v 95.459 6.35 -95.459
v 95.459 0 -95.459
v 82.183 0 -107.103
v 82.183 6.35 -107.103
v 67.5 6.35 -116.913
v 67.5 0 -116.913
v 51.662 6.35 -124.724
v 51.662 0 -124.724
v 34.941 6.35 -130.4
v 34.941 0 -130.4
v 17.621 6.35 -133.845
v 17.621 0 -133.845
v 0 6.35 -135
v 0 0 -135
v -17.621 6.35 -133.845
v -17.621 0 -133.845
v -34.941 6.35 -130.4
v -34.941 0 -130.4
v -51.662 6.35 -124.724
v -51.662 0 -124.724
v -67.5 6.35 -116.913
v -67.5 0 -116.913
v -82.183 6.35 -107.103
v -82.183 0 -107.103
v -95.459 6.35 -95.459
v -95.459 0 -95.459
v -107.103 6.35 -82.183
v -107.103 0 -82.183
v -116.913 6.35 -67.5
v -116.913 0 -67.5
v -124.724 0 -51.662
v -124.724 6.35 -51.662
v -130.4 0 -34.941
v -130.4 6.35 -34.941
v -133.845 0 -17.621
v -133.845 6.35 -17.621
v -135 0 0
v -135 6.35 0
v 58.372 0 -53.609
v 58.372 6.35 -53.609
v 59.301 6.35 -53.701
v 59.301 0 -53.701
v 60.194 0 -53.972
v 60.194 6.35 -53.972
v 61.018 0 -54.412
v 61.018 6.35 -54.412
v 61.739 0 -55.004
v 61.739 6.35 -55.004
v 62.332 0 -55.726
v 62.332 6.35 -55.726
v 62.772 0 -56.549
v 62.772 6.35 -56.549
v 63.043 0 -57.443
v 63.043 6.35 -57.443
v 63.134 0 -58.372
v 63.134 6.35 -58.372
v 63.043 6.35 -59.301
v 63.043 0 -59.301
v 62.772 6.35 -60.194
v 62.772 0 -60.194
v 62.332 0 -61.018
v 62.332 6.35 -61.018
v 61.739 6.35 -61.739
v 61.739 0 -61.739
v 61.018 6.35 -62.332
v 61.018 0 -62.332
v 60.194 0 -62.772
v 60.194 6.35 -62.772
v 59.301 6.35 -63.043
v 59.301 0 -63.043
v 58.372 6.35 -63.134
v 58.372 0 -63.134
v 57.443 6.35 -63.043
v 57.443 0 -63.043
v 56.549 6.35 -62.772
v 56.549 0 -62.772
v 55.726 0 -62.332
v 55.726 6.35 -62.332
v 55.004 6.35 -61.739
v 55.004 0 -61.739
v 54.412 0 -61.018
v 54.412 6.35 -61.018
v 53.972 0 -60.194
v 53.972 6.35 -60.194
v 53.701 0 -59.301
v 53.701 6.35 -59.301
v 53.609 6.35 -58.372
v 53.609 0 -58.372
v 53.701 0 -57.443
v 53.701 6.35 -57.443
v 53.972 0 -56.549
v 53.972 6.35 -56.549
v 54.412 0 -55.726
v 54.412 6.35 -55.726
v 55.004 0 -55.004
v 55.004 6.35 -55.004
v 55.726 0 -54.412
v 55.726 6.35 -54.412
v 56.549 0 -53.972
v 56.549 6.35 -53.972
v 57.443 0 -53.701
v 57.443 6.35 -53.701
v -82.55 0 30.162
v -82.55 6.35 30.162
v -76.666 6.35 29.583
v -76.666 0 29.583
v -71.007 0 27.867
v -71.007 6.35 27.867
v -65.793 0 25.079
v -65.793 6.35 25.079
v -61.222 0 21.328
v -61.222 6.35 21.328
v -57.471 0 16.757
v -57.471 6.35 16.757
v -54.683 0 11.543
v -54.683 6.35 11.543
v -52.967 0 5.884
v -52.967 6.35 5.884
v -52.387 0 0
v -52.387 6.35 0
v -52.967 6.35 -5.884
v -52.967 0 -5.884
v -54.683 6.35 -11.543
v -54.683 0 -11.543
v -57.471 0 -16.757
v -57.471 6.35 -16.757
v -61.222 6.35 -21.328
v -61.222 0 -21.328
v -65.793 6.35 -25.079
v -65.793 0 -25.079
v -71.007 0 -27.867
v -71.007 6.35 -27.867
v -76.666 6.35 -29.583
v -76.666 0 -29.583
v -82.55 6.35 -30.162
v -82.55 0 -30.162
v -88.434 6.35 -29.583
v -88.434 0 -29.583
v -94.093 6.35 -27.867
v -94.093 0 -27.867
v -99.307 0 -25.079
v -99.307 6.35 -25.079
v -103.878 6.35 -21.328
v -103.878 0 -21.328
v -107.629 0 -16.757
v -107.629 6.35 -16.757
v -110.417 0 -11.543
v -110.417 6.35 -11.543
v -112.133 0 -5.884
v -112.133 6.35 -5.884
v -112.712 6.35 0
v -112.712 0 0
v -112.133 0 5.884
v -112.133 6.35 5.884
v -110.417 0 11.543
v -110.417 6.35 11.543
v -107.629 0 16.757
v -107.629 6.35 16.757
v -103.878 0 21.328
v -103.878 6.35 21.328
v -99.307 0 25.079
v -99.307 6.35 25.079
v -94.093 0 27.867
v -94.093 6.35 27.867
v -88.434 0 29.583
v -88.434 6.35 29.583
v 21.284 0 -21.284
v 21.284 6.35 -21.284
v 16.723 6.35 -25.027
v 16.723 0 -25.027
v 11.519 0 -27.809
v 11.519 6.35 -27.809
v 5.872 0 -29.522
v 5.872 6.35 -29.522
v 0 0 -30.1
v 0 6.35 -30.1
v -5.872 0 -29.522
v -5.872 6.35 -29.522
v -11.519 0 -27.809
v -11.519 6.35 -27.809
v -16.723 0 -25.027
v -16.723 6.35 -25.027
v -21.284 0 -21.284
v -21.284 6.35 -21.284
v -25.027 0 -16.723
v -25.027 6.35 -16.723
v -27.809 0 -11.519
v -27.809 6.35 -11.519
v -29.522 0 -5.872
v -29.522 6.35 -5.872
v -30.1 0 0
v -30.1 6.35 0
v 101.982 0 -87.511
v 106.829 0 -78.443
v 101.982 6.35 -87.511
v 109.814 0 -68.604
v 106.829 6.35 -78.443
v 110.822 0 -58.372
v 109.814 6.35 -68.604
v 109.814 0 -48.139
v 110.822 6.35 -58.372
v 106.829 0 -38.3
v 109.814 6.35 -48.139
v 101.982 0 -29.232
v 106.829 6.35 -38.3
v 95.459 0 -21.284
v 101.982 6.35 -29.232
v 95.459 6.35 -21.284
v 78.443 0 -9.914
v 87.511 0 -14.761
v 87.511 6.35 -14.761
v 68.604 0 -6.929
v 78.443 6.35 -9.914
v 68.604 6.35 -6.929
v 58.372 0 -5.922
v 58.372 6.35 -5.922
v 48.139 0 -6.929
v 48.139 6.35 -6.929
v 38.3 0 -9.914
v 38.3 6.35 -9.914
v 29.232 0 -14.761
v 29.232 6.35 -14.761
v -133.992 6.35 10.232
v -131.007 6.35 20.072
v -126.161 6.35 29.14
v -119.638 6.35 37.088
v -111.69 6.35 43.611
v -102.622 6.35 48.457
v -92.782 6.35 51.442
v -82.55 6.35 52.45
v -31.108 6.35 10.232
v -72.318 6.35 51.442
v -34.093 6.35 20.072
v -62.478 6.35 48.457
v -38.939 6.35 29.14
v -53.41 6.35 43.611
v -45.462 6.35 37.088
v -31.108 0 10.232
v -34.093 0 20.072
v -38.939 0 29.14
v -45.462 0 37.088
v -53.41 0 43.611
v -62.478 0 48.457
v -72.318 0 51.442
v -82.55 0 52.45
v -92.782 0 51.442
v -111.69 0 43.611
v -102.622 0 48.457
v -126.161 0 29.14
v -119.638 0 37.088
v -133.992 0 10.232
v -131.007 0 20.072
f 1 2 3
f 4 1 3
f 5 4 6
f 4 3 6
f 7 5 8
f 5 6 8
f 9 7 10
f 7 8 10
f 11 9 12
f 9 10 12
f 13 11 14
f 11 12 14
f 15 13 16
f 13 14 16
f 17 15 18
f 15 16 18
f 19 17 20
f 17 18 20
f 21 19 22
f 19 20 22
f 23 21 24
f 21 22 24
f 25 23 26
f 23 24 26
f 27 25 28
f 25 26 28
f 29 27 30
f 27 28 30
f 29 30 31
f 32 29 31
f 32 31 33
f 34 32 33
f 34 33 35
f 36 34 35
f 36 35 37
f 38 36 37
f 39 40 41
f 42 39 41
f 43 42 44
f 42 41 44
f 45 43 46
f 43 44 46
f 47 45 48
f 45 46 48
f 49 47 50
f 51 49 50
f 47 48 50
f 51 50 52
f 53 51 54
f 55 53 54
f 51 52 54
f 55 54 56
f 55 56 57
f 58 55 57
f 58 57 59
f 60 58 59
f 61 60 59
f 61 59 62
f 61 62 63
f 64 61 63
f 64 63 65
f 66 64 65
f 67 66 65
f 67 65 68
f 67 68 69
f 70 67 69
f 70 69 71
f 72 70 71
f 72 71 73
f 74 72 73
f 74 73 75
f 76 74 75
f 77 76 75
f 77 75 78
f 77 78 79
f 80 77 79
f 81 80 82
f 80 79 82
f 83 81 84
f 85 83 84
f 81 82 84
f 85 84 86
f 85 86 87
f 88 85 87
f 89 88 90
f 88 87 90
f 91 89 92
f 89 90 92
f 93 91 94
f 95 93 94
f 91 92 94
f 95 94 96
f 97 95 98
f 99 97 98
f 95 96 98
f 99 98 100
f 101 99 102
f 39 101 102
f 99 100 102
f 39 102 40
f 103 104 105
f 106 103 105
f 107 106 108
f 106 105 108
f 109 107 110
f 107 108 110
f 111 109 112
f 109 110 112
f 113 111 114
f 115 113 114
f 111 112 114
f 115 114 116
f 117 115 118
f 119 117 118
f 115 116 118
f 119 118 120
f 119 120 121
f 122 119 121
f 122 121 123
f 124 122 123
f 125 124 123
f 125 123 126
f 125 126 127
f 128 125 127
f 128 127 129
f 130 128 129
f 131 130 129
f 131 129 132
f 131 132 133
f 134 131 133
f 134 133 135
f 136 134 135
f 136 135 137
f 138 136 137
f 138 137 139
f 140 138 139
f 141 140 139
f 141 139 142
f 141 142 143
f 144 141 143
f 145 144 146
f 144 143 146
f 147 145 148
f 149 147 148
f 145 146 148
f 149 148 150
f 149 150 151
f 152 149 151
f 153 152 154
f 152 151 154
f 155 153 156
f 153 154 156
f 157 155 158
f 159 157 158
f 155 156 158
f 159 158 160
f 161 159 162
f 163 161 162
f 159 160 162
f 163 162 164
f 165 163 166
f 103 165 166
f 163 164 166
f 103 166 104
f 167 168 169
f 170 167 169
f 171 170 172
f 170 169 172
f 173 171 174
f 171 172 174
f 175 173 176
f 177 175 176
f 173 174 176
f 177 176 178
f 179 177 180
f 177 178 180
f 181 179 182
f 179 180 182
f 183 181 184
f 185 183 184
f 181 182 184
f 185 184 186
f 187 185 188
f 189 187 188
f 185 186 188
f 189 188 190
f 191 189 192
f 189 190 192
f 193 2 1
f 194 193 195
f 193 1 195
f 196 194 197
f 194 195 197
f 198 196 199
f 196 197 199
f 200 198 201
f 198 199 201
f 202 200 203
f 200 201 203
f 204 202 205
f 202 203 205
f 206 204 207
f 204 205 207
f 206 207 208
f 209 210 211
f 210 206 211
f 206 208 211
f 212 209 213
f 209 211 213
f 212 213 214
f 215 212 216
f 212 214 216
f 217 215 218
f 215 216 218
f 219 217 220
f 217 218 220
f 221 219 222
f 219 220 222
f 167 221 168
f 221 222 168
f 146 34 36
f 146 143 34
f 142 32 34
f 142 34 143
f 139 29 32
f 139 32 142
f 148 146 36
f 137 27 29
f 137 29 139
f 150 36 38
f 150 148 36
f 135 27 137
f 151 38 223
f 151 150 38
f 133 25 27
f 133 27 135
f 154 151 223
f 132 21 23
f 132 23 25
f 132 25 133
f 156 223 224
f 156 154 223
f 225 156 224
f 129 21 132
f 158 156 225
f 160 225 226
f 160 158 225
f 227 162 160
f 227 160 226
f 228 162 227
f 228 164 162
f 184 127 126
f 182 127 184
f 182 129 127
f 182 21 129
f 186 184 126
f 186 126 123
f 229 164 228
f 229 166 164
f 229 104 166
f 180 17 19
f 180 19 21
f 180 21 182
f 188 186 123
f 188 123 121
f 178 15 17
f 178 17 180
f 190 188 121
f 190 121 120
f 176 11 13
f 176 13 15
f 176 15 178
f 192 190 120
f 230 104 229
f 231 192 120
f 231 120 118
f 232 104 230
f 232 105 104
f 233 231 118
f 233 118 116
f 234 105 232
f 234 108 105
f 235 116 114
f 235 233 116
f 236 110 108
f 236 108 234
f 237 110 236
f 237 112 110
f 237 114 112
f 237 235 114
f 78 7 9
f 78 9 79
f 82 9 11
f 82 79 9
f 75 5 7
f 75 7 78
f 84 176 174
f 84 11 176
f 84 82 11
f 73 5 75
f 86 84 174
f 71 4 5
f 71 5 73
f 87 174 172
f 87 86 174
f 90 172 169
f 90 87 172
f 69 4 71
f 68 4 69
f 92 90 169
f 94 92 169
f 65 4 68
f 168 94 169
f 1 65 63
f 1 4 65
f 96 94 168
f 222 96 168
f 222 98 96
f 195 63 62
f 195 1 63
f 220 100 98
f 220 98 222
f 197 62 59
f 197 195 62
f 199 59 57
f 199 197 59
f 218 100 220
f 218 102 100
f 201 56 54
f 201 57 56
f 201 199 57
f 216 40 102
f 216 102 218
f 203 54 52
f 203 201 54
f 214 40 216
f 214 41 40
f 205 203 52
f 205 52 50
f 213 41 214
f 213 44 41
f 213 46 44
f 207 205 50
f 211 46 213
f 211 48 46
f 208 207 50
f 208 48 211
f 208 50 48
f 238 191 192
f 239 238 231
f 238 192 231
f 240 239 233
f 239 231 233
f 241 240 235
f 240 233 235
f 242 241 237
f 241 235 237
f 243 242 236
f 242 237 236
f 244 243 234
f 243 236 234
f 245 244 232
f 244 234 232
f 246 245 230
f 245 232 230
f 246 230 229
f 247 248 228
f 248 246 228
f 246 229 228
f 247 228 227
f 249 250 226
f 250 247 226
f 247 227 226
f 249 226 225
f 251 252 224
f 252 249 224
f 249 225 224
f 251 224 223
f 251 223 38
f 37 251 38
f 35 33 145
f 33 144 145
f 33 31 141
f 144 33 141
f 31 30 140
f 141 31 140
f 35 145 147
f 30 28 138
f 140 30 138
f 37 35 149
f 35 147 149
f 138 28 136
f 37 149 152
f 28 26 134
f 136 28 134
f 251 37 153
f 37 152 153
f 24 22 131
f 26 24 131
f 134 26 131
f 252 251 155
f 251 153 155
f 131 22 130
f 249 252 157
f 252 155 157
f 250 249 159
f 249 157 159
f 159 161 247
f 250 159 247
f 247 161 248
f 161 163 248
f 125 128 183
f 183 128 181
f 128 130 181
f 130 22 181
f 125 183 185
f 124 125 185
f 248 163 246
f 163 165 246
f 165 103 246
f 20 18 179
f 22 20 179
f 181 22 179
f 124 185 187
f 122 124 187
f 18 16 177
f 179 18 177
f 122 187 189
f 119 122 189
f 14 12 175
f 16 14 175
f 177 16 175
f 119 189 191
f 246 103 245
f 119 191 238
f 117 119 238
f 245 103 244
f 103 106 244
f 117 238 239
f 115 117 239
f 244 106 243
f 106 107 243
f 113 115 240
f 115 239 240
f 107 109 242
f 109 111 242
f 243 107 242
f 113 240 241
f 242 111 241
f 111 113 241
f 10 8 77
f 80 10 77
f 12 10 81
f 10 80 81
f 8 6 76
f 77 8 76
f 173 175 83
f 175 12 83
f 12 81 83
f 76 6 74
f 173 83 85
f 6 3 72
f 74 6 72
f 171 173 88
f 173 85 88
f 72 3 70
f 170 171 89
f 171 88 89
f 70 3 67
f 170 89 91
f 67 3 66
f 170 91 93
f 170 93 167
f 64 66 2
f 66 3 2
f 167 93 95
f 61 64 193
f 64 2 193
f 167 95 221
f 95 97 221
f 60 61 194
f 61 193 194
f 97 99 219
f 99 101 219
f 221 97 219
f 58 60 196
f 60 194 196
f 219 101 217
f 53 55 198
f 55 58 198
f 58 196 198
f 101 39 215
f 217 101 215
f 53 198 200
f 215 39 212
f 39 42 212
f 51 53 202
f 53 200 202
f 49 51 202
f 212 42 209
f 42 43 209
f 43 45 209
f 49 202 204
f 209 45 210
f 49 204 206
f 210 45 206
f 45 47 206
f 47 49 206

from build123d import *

# Parameters (mm, degrees)
SKETCH1_R           = 135
BOSS_EXTRUDE1_DEPTH = 6.35
SKETCH2_R           = 30.1625
CUT_EXTRUDE1_DEPTH  = 192.024402891
SKETCH3_R           = 4.7625
CUT_EXTRUDE2_DEPTH  = 192.024402891


with BuildPart() as part:
    # Sketch1 → Boss-Extrude1 (new body)
    with BuildSketch(Plane(origin=(0, 0, 0), x_dir=(1, 0, 0), z_dir=(0, 1, 0))):
        with Locations(Location((0, 0, 0), (0, 0, 270))):
            Circle(SKETCH1_R)
    extrude(amount=BOSS_EXTRUDE1_DEPTH)

    # Sketch2 → Cut-Extrude1 (cut, through all)
    with BuildSketch(Plane(origin=(0, 6.35, 0), x_dir=(1, 0, 0), z_dir=(0, 1, 0))):
        with BuildLine():
            ThreePointArc((-30.1, 0), (-82.55, -52.45), (-135, 0))
            ThreePointArc((-135, 0), (0, -135), (135, 0))
            ThreePointArc((135, 0), (124.723736889, 51.662263369), (95.45941546, 95.45941546))
            ThreePointArc((95.45941546, 95.45941546), (95.45941546, 21.283914114), (21.283914114, 21.283914114))
            ThreePointArc((21.283914114, 21.283914114), (-11.518771314, 27.808773929), (-30.1, 0))
        make_face()
        with Locations(Location((-82.55, 0, 0), (0, 0, 270))):
            Circle(SKETCH2_R)
    extrude(amount=-CUT_EXTRUDE1_DEPTH, mode=Mode.SUBTRACT)

    # Sketch3 → Cut-Extrude2 (cut, through all)
    with BuildSketch(Plane(origin=(0, 6.35, 0), x_dir=(1, 0, 0), z_dir=(0, 1, 0))):
        with Locations(Location((58.371664787, 58.371664787, 0), (0, 0, 270))):
            Circle(SKETCH3_R)
    extrude(amount=-CUT_EXTRUDE2_DEPTH, mode=Mode.SUBTRACT)


solid = part.part
